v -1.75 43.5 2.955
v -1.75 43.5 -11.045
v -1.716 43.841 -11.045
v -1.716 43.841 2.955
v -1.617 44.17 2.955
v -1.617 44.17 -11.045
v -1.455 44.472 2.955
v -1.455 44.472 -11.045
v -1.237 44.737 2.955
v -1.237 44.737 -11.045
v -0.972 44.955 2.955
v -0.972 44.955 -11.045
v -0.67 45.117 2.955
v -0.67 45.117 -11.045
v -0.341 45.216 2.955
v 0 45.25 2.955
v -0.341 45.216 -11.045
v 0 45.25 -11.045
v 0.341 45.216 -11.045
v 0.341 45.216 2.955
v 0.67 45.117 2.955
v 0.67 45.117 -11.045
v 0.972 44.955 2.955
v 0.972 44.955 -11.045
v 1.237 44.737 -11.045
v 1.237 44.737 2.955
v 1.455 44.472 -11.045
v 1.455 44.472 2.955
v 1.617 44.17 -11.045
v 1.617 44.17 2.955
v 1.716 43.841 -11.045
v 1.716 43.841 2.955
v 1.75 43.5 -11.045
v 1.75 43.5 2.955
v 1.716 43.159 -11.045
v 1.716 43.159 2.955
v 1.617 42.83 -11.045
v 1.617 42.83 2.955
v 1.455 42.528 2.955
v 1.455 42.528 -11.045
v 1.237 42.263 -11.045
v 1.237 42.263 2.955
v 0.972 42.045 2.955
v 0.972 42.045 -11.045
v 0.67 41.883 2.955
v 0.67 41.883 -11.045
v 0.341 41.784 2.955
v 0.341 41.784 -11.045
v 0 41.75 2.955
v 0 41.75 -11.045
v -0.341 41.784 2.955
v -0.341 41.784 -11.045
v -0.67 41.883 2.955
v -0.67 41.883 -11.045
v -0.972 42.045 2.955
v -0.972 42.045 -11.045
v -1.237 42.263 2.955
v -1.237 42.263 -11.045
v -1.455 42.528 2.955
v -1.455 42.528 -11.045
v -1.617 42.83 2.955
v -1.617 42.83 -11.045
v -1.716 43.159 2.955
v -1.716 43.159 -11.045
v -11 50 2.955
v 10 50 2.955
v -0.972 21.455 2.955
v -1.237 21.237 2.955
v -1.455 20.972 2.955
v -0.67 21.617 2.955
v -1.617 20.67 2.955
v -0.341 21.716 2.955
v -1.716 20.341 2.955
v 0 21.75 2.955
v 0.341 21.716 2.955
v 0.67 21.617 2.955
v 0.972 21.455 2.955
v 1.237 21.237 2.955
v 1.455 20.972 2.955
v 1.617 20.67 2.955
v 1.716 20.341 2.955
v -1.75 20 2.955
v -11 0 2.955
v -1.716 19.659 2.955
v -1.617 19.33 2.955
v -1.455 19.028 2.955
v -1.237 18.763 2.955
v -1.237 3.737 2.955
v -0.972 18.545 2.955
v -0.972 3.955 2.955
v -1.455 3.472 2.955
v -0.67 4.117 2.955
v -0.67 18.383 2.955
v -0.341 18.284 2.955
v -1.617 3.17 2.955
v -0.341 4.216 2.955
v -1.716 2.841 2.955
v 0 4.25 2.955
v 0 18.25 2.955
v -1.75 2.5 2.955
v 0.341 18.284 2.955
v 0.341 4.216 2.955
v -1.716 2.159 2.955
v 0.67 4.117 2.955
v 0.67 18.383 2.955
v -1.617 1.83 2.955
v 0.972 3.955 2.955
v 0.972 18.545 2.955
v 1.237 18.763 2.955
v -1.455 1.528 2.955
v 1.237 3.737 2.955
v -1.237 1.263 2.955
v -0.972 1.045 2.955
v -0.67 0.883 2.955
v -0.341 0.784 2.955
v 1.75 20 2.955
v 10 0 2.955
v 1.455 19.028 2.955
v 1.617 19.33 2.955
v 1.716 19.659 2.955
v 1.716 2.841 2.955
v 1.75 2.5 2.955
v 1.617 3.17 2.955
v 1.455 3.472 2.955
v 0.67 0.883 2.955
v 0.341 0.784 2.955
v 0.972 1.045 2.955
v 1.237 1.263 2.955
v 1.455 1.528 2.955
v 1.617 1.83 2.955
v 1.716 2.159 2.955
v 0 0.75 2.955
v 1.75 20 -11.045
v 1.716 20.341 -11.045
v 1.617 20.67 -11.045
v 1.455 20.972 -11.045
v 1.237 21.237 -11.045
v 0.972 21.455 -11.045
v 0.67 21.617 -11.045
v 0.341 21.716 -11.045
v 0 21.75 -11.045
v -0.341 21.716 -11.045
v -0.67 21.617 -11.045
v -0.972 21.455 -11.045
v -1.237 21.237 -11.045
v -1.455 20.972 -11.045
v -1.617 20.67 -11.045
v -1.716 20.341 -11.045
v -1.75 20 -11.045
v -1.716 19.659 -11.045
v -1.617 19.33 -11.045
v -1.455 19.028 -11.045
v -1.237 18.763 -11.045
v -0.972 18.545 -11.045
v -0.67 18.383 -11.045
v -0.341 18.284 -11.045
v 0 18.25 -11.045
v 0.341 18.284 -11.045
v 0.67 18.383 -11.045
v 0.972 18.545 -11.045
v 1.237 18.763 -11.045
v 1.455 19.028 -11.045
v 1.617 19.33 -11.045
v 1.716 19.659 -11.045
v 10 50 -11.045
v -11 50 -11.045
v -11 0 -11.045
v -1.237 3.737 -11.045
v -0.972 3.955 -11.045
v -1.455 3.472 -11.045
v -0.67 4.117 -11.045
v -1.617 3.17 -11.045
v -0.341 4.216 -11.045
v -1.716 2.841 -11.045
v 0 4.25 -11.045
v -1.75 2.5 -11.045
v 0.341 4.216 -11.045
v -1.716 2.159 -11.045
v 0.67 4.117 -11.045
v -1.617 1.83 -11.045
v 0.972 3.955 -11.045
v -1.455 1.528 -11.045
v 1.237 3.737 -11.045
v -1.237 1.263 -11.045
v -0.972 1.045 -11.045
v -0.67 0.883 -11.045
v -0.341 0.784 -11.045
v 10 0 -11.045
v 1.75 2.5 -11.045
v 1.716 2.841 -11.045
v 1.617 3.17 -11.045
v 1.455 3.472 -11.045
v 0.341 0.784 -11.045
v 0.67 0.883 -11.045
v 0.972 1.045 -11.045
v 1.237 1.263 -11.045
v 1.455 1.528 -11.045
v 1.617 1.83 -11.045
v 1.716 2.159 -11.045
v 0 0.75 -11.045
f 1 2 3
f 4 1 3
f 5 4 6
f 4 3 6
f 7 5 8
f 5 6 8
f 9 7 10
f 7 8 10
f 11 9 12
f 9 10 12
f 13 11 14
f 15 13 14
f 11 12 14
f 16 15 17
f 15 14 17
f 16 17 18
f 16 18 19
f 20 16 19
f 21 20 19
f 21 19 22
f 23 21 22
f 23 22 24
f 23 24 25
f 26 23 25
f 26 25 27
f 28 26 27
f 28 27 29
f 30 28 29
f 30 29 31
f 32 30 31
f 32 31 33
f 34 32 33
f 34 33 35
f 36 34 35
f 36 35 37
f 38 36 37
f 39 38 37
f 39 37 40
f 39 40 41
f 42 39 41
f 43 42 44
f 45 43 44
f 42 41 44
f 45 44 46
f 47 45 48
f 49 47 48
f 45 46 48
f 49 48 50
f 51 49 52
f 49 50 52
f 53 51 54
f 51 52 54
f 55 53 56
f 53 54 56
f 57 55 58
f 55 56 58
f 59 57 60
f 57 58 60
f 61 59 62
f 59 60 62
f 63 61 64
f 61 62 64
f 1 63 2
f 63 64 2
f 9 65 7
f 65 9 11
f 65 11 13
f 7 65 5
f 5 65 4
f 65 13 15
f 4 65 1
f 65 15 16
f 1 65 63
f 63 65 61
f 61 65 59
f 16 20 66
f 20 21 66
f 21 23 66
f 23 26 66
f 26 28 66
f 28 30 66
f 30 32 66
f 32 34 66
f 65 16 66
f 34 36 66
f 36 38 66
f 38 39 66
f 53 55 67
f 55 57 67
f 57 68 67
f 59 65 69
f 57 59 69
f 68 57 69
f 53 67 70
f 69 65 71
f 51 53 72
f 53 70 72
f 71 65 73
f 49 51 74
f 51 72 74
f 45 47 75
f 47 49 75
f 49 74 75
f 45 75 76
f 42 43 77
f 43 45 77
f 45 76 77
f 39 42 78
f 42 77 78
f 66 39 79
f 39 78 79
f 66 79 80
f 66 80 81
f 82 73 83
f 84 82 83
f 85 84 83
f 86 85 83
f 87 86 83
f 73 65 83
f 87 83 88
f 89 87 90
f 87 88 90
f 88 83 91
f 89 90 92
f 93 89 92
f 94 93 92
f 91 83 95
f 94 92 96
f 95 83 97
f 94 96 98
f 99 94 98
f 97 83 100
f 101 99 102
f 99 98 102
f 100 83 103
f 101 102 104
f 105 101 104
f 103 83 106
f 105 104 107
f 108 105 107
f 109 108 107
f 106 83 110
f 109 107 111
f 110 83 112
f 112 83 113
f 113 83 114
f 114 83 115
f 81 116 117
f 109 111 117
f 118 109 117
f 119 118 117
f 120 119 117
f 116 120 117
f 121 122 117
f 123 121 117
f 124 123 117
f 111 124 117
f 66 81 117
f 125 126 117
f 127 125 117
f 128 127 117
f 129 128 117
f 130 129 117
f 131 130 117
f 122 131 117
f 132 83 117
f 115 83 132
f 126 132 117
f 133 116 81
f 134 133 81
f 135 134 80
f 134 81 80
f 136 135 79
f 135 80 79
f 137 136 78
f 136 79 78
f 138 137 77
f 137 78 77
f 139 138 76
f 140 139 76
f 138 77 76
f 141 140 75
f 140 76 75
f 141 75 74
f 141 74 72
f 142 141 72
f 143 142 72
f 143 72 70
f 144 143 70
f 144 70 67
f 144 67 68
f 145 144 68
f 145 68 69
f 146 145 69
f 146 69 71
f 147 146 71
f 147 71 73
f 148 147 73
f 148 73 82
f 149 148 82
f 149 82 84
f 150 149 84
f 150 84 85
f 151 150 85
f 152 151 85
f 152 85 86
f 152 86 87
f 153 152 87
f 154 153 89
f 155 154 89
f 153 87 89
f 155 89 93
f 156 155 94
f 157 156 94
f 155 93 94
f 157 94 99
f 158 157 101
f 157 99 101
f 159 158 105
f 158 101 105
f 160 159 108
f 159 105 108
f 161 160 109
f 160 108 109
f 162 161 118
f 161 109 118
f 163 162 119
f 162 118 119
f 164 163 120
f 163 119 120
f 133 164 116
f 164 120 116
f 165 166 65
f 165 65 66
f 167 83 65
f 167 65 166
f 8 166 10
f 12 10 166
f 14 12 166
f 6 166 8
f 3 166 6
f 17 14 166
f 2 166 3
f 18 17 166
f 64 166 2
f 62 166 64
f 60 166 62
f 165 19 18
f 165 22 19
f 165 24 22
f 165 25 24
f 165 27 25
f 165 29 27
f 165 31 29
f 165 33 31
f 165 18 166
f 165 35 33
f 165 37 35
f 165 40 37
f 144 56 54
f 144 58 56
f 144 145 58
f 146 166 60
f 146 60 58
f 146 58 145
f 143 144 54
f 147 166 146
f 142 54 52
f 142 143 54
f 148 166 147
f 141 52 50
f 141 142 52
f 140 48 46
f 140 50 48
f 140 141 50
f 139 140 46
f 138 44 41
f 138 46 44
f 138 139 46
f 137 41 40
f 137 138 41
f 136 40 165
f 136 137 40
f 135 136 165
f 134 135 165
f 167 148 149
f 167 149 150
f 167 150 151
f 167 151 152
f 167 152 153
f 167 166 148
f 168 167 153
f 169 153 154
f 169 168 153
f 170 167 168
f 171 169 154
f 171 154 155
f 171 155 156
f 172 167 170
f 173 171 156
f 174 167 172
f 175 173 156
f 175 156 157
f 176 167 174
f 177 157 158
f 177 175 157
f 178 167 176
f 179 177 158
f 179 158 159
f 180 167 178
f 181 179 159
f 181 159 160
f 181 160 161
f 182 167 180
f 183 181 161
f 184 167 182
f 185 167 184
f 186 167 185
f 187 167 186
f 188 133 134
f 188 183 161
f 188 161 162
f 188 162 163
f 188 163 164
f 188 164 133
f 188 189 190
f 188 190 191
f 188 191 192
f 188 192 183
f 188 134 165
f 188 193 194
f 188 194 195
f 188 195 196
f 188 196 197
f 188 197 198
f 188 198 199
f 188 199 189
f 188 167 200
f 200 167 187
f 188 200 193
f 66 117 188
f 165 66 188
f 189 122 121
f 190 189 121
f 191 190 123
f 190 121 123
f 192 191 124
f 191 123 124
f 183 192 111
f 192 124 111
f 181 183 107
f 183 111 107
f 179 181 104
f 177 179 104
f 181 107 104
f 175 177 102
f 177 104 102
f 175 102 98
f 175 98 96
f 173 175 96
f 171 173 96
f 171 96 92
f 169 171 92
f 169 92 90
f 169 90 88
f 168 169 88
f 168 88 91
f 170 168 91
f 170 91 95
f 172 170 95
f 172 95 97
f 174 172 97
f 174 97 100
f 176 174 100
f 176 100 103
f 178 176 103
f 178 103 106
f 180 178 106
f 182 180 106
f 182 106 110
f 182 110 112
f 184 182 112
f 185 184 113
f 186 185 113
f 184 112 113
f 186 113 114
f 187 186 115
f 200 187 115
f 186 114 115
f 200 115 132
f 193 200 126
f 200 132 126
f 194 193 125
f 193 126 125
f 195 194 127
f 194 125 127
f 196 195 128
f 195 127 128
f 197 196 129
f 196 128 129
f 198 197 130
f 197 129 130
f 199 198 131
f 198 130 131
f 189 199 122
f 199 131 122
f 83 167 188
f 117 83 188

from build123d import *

# Parameters (mm, degrees)
SKETCH1_W           = 21
SKETCH1_H           = 14
BOSS_EXTRUDE1_DEPTH = 50
SKETCH2_R           = 1.75
CUT_EXTRUDE1_DEPTH  = 100
SKETCH3_R           = 1.75
CUT_EXTRUDE2_DEPTH  = 22


with BuildPart() as part:
    # Sketch1 → Boss-Extrude1 (new body)
    with BuildSketch(Plane(origin=(0, 0, 0), x_dir=(1, 0, 0), z_dir=(0, 1, 0))):
        with Locations((-0.5, 4.045454545)):
            Rectangle(SKETCH1_W, SKETCH1_H)
    extrude(amount=BOSS_EXTRUDE1_DEPTH)

    # Sketch2 → Cut-Extrude1 (cut)
    with BuildSketch(Plane.XY.offset(2.954545455)):
        with Locations((0, 2.5)):
            Circle(SKETCH2_R)
        with Locations((0, 20)):
            Circle(SKETCH2_R)
    extrude(amount=-CUT_EXTRUDE1_DEPTH, mode=Mode.SUBTRACT)

    # Sketch3 → Cut-Extrude2 (cut)
    with BuildSketch(Plane(origin=(0, 0, -11.045454545), x_dir=(-1, 0, 0), z_dir=(0, 0, -1))):
        with Locations((0, 43.5)):
            Circle(SKETCH3_R)
    extrude(amount=-CUT_EXTRUDE2_DEPTH, mode=Mode.SUBTRACT)


solid = part.part
